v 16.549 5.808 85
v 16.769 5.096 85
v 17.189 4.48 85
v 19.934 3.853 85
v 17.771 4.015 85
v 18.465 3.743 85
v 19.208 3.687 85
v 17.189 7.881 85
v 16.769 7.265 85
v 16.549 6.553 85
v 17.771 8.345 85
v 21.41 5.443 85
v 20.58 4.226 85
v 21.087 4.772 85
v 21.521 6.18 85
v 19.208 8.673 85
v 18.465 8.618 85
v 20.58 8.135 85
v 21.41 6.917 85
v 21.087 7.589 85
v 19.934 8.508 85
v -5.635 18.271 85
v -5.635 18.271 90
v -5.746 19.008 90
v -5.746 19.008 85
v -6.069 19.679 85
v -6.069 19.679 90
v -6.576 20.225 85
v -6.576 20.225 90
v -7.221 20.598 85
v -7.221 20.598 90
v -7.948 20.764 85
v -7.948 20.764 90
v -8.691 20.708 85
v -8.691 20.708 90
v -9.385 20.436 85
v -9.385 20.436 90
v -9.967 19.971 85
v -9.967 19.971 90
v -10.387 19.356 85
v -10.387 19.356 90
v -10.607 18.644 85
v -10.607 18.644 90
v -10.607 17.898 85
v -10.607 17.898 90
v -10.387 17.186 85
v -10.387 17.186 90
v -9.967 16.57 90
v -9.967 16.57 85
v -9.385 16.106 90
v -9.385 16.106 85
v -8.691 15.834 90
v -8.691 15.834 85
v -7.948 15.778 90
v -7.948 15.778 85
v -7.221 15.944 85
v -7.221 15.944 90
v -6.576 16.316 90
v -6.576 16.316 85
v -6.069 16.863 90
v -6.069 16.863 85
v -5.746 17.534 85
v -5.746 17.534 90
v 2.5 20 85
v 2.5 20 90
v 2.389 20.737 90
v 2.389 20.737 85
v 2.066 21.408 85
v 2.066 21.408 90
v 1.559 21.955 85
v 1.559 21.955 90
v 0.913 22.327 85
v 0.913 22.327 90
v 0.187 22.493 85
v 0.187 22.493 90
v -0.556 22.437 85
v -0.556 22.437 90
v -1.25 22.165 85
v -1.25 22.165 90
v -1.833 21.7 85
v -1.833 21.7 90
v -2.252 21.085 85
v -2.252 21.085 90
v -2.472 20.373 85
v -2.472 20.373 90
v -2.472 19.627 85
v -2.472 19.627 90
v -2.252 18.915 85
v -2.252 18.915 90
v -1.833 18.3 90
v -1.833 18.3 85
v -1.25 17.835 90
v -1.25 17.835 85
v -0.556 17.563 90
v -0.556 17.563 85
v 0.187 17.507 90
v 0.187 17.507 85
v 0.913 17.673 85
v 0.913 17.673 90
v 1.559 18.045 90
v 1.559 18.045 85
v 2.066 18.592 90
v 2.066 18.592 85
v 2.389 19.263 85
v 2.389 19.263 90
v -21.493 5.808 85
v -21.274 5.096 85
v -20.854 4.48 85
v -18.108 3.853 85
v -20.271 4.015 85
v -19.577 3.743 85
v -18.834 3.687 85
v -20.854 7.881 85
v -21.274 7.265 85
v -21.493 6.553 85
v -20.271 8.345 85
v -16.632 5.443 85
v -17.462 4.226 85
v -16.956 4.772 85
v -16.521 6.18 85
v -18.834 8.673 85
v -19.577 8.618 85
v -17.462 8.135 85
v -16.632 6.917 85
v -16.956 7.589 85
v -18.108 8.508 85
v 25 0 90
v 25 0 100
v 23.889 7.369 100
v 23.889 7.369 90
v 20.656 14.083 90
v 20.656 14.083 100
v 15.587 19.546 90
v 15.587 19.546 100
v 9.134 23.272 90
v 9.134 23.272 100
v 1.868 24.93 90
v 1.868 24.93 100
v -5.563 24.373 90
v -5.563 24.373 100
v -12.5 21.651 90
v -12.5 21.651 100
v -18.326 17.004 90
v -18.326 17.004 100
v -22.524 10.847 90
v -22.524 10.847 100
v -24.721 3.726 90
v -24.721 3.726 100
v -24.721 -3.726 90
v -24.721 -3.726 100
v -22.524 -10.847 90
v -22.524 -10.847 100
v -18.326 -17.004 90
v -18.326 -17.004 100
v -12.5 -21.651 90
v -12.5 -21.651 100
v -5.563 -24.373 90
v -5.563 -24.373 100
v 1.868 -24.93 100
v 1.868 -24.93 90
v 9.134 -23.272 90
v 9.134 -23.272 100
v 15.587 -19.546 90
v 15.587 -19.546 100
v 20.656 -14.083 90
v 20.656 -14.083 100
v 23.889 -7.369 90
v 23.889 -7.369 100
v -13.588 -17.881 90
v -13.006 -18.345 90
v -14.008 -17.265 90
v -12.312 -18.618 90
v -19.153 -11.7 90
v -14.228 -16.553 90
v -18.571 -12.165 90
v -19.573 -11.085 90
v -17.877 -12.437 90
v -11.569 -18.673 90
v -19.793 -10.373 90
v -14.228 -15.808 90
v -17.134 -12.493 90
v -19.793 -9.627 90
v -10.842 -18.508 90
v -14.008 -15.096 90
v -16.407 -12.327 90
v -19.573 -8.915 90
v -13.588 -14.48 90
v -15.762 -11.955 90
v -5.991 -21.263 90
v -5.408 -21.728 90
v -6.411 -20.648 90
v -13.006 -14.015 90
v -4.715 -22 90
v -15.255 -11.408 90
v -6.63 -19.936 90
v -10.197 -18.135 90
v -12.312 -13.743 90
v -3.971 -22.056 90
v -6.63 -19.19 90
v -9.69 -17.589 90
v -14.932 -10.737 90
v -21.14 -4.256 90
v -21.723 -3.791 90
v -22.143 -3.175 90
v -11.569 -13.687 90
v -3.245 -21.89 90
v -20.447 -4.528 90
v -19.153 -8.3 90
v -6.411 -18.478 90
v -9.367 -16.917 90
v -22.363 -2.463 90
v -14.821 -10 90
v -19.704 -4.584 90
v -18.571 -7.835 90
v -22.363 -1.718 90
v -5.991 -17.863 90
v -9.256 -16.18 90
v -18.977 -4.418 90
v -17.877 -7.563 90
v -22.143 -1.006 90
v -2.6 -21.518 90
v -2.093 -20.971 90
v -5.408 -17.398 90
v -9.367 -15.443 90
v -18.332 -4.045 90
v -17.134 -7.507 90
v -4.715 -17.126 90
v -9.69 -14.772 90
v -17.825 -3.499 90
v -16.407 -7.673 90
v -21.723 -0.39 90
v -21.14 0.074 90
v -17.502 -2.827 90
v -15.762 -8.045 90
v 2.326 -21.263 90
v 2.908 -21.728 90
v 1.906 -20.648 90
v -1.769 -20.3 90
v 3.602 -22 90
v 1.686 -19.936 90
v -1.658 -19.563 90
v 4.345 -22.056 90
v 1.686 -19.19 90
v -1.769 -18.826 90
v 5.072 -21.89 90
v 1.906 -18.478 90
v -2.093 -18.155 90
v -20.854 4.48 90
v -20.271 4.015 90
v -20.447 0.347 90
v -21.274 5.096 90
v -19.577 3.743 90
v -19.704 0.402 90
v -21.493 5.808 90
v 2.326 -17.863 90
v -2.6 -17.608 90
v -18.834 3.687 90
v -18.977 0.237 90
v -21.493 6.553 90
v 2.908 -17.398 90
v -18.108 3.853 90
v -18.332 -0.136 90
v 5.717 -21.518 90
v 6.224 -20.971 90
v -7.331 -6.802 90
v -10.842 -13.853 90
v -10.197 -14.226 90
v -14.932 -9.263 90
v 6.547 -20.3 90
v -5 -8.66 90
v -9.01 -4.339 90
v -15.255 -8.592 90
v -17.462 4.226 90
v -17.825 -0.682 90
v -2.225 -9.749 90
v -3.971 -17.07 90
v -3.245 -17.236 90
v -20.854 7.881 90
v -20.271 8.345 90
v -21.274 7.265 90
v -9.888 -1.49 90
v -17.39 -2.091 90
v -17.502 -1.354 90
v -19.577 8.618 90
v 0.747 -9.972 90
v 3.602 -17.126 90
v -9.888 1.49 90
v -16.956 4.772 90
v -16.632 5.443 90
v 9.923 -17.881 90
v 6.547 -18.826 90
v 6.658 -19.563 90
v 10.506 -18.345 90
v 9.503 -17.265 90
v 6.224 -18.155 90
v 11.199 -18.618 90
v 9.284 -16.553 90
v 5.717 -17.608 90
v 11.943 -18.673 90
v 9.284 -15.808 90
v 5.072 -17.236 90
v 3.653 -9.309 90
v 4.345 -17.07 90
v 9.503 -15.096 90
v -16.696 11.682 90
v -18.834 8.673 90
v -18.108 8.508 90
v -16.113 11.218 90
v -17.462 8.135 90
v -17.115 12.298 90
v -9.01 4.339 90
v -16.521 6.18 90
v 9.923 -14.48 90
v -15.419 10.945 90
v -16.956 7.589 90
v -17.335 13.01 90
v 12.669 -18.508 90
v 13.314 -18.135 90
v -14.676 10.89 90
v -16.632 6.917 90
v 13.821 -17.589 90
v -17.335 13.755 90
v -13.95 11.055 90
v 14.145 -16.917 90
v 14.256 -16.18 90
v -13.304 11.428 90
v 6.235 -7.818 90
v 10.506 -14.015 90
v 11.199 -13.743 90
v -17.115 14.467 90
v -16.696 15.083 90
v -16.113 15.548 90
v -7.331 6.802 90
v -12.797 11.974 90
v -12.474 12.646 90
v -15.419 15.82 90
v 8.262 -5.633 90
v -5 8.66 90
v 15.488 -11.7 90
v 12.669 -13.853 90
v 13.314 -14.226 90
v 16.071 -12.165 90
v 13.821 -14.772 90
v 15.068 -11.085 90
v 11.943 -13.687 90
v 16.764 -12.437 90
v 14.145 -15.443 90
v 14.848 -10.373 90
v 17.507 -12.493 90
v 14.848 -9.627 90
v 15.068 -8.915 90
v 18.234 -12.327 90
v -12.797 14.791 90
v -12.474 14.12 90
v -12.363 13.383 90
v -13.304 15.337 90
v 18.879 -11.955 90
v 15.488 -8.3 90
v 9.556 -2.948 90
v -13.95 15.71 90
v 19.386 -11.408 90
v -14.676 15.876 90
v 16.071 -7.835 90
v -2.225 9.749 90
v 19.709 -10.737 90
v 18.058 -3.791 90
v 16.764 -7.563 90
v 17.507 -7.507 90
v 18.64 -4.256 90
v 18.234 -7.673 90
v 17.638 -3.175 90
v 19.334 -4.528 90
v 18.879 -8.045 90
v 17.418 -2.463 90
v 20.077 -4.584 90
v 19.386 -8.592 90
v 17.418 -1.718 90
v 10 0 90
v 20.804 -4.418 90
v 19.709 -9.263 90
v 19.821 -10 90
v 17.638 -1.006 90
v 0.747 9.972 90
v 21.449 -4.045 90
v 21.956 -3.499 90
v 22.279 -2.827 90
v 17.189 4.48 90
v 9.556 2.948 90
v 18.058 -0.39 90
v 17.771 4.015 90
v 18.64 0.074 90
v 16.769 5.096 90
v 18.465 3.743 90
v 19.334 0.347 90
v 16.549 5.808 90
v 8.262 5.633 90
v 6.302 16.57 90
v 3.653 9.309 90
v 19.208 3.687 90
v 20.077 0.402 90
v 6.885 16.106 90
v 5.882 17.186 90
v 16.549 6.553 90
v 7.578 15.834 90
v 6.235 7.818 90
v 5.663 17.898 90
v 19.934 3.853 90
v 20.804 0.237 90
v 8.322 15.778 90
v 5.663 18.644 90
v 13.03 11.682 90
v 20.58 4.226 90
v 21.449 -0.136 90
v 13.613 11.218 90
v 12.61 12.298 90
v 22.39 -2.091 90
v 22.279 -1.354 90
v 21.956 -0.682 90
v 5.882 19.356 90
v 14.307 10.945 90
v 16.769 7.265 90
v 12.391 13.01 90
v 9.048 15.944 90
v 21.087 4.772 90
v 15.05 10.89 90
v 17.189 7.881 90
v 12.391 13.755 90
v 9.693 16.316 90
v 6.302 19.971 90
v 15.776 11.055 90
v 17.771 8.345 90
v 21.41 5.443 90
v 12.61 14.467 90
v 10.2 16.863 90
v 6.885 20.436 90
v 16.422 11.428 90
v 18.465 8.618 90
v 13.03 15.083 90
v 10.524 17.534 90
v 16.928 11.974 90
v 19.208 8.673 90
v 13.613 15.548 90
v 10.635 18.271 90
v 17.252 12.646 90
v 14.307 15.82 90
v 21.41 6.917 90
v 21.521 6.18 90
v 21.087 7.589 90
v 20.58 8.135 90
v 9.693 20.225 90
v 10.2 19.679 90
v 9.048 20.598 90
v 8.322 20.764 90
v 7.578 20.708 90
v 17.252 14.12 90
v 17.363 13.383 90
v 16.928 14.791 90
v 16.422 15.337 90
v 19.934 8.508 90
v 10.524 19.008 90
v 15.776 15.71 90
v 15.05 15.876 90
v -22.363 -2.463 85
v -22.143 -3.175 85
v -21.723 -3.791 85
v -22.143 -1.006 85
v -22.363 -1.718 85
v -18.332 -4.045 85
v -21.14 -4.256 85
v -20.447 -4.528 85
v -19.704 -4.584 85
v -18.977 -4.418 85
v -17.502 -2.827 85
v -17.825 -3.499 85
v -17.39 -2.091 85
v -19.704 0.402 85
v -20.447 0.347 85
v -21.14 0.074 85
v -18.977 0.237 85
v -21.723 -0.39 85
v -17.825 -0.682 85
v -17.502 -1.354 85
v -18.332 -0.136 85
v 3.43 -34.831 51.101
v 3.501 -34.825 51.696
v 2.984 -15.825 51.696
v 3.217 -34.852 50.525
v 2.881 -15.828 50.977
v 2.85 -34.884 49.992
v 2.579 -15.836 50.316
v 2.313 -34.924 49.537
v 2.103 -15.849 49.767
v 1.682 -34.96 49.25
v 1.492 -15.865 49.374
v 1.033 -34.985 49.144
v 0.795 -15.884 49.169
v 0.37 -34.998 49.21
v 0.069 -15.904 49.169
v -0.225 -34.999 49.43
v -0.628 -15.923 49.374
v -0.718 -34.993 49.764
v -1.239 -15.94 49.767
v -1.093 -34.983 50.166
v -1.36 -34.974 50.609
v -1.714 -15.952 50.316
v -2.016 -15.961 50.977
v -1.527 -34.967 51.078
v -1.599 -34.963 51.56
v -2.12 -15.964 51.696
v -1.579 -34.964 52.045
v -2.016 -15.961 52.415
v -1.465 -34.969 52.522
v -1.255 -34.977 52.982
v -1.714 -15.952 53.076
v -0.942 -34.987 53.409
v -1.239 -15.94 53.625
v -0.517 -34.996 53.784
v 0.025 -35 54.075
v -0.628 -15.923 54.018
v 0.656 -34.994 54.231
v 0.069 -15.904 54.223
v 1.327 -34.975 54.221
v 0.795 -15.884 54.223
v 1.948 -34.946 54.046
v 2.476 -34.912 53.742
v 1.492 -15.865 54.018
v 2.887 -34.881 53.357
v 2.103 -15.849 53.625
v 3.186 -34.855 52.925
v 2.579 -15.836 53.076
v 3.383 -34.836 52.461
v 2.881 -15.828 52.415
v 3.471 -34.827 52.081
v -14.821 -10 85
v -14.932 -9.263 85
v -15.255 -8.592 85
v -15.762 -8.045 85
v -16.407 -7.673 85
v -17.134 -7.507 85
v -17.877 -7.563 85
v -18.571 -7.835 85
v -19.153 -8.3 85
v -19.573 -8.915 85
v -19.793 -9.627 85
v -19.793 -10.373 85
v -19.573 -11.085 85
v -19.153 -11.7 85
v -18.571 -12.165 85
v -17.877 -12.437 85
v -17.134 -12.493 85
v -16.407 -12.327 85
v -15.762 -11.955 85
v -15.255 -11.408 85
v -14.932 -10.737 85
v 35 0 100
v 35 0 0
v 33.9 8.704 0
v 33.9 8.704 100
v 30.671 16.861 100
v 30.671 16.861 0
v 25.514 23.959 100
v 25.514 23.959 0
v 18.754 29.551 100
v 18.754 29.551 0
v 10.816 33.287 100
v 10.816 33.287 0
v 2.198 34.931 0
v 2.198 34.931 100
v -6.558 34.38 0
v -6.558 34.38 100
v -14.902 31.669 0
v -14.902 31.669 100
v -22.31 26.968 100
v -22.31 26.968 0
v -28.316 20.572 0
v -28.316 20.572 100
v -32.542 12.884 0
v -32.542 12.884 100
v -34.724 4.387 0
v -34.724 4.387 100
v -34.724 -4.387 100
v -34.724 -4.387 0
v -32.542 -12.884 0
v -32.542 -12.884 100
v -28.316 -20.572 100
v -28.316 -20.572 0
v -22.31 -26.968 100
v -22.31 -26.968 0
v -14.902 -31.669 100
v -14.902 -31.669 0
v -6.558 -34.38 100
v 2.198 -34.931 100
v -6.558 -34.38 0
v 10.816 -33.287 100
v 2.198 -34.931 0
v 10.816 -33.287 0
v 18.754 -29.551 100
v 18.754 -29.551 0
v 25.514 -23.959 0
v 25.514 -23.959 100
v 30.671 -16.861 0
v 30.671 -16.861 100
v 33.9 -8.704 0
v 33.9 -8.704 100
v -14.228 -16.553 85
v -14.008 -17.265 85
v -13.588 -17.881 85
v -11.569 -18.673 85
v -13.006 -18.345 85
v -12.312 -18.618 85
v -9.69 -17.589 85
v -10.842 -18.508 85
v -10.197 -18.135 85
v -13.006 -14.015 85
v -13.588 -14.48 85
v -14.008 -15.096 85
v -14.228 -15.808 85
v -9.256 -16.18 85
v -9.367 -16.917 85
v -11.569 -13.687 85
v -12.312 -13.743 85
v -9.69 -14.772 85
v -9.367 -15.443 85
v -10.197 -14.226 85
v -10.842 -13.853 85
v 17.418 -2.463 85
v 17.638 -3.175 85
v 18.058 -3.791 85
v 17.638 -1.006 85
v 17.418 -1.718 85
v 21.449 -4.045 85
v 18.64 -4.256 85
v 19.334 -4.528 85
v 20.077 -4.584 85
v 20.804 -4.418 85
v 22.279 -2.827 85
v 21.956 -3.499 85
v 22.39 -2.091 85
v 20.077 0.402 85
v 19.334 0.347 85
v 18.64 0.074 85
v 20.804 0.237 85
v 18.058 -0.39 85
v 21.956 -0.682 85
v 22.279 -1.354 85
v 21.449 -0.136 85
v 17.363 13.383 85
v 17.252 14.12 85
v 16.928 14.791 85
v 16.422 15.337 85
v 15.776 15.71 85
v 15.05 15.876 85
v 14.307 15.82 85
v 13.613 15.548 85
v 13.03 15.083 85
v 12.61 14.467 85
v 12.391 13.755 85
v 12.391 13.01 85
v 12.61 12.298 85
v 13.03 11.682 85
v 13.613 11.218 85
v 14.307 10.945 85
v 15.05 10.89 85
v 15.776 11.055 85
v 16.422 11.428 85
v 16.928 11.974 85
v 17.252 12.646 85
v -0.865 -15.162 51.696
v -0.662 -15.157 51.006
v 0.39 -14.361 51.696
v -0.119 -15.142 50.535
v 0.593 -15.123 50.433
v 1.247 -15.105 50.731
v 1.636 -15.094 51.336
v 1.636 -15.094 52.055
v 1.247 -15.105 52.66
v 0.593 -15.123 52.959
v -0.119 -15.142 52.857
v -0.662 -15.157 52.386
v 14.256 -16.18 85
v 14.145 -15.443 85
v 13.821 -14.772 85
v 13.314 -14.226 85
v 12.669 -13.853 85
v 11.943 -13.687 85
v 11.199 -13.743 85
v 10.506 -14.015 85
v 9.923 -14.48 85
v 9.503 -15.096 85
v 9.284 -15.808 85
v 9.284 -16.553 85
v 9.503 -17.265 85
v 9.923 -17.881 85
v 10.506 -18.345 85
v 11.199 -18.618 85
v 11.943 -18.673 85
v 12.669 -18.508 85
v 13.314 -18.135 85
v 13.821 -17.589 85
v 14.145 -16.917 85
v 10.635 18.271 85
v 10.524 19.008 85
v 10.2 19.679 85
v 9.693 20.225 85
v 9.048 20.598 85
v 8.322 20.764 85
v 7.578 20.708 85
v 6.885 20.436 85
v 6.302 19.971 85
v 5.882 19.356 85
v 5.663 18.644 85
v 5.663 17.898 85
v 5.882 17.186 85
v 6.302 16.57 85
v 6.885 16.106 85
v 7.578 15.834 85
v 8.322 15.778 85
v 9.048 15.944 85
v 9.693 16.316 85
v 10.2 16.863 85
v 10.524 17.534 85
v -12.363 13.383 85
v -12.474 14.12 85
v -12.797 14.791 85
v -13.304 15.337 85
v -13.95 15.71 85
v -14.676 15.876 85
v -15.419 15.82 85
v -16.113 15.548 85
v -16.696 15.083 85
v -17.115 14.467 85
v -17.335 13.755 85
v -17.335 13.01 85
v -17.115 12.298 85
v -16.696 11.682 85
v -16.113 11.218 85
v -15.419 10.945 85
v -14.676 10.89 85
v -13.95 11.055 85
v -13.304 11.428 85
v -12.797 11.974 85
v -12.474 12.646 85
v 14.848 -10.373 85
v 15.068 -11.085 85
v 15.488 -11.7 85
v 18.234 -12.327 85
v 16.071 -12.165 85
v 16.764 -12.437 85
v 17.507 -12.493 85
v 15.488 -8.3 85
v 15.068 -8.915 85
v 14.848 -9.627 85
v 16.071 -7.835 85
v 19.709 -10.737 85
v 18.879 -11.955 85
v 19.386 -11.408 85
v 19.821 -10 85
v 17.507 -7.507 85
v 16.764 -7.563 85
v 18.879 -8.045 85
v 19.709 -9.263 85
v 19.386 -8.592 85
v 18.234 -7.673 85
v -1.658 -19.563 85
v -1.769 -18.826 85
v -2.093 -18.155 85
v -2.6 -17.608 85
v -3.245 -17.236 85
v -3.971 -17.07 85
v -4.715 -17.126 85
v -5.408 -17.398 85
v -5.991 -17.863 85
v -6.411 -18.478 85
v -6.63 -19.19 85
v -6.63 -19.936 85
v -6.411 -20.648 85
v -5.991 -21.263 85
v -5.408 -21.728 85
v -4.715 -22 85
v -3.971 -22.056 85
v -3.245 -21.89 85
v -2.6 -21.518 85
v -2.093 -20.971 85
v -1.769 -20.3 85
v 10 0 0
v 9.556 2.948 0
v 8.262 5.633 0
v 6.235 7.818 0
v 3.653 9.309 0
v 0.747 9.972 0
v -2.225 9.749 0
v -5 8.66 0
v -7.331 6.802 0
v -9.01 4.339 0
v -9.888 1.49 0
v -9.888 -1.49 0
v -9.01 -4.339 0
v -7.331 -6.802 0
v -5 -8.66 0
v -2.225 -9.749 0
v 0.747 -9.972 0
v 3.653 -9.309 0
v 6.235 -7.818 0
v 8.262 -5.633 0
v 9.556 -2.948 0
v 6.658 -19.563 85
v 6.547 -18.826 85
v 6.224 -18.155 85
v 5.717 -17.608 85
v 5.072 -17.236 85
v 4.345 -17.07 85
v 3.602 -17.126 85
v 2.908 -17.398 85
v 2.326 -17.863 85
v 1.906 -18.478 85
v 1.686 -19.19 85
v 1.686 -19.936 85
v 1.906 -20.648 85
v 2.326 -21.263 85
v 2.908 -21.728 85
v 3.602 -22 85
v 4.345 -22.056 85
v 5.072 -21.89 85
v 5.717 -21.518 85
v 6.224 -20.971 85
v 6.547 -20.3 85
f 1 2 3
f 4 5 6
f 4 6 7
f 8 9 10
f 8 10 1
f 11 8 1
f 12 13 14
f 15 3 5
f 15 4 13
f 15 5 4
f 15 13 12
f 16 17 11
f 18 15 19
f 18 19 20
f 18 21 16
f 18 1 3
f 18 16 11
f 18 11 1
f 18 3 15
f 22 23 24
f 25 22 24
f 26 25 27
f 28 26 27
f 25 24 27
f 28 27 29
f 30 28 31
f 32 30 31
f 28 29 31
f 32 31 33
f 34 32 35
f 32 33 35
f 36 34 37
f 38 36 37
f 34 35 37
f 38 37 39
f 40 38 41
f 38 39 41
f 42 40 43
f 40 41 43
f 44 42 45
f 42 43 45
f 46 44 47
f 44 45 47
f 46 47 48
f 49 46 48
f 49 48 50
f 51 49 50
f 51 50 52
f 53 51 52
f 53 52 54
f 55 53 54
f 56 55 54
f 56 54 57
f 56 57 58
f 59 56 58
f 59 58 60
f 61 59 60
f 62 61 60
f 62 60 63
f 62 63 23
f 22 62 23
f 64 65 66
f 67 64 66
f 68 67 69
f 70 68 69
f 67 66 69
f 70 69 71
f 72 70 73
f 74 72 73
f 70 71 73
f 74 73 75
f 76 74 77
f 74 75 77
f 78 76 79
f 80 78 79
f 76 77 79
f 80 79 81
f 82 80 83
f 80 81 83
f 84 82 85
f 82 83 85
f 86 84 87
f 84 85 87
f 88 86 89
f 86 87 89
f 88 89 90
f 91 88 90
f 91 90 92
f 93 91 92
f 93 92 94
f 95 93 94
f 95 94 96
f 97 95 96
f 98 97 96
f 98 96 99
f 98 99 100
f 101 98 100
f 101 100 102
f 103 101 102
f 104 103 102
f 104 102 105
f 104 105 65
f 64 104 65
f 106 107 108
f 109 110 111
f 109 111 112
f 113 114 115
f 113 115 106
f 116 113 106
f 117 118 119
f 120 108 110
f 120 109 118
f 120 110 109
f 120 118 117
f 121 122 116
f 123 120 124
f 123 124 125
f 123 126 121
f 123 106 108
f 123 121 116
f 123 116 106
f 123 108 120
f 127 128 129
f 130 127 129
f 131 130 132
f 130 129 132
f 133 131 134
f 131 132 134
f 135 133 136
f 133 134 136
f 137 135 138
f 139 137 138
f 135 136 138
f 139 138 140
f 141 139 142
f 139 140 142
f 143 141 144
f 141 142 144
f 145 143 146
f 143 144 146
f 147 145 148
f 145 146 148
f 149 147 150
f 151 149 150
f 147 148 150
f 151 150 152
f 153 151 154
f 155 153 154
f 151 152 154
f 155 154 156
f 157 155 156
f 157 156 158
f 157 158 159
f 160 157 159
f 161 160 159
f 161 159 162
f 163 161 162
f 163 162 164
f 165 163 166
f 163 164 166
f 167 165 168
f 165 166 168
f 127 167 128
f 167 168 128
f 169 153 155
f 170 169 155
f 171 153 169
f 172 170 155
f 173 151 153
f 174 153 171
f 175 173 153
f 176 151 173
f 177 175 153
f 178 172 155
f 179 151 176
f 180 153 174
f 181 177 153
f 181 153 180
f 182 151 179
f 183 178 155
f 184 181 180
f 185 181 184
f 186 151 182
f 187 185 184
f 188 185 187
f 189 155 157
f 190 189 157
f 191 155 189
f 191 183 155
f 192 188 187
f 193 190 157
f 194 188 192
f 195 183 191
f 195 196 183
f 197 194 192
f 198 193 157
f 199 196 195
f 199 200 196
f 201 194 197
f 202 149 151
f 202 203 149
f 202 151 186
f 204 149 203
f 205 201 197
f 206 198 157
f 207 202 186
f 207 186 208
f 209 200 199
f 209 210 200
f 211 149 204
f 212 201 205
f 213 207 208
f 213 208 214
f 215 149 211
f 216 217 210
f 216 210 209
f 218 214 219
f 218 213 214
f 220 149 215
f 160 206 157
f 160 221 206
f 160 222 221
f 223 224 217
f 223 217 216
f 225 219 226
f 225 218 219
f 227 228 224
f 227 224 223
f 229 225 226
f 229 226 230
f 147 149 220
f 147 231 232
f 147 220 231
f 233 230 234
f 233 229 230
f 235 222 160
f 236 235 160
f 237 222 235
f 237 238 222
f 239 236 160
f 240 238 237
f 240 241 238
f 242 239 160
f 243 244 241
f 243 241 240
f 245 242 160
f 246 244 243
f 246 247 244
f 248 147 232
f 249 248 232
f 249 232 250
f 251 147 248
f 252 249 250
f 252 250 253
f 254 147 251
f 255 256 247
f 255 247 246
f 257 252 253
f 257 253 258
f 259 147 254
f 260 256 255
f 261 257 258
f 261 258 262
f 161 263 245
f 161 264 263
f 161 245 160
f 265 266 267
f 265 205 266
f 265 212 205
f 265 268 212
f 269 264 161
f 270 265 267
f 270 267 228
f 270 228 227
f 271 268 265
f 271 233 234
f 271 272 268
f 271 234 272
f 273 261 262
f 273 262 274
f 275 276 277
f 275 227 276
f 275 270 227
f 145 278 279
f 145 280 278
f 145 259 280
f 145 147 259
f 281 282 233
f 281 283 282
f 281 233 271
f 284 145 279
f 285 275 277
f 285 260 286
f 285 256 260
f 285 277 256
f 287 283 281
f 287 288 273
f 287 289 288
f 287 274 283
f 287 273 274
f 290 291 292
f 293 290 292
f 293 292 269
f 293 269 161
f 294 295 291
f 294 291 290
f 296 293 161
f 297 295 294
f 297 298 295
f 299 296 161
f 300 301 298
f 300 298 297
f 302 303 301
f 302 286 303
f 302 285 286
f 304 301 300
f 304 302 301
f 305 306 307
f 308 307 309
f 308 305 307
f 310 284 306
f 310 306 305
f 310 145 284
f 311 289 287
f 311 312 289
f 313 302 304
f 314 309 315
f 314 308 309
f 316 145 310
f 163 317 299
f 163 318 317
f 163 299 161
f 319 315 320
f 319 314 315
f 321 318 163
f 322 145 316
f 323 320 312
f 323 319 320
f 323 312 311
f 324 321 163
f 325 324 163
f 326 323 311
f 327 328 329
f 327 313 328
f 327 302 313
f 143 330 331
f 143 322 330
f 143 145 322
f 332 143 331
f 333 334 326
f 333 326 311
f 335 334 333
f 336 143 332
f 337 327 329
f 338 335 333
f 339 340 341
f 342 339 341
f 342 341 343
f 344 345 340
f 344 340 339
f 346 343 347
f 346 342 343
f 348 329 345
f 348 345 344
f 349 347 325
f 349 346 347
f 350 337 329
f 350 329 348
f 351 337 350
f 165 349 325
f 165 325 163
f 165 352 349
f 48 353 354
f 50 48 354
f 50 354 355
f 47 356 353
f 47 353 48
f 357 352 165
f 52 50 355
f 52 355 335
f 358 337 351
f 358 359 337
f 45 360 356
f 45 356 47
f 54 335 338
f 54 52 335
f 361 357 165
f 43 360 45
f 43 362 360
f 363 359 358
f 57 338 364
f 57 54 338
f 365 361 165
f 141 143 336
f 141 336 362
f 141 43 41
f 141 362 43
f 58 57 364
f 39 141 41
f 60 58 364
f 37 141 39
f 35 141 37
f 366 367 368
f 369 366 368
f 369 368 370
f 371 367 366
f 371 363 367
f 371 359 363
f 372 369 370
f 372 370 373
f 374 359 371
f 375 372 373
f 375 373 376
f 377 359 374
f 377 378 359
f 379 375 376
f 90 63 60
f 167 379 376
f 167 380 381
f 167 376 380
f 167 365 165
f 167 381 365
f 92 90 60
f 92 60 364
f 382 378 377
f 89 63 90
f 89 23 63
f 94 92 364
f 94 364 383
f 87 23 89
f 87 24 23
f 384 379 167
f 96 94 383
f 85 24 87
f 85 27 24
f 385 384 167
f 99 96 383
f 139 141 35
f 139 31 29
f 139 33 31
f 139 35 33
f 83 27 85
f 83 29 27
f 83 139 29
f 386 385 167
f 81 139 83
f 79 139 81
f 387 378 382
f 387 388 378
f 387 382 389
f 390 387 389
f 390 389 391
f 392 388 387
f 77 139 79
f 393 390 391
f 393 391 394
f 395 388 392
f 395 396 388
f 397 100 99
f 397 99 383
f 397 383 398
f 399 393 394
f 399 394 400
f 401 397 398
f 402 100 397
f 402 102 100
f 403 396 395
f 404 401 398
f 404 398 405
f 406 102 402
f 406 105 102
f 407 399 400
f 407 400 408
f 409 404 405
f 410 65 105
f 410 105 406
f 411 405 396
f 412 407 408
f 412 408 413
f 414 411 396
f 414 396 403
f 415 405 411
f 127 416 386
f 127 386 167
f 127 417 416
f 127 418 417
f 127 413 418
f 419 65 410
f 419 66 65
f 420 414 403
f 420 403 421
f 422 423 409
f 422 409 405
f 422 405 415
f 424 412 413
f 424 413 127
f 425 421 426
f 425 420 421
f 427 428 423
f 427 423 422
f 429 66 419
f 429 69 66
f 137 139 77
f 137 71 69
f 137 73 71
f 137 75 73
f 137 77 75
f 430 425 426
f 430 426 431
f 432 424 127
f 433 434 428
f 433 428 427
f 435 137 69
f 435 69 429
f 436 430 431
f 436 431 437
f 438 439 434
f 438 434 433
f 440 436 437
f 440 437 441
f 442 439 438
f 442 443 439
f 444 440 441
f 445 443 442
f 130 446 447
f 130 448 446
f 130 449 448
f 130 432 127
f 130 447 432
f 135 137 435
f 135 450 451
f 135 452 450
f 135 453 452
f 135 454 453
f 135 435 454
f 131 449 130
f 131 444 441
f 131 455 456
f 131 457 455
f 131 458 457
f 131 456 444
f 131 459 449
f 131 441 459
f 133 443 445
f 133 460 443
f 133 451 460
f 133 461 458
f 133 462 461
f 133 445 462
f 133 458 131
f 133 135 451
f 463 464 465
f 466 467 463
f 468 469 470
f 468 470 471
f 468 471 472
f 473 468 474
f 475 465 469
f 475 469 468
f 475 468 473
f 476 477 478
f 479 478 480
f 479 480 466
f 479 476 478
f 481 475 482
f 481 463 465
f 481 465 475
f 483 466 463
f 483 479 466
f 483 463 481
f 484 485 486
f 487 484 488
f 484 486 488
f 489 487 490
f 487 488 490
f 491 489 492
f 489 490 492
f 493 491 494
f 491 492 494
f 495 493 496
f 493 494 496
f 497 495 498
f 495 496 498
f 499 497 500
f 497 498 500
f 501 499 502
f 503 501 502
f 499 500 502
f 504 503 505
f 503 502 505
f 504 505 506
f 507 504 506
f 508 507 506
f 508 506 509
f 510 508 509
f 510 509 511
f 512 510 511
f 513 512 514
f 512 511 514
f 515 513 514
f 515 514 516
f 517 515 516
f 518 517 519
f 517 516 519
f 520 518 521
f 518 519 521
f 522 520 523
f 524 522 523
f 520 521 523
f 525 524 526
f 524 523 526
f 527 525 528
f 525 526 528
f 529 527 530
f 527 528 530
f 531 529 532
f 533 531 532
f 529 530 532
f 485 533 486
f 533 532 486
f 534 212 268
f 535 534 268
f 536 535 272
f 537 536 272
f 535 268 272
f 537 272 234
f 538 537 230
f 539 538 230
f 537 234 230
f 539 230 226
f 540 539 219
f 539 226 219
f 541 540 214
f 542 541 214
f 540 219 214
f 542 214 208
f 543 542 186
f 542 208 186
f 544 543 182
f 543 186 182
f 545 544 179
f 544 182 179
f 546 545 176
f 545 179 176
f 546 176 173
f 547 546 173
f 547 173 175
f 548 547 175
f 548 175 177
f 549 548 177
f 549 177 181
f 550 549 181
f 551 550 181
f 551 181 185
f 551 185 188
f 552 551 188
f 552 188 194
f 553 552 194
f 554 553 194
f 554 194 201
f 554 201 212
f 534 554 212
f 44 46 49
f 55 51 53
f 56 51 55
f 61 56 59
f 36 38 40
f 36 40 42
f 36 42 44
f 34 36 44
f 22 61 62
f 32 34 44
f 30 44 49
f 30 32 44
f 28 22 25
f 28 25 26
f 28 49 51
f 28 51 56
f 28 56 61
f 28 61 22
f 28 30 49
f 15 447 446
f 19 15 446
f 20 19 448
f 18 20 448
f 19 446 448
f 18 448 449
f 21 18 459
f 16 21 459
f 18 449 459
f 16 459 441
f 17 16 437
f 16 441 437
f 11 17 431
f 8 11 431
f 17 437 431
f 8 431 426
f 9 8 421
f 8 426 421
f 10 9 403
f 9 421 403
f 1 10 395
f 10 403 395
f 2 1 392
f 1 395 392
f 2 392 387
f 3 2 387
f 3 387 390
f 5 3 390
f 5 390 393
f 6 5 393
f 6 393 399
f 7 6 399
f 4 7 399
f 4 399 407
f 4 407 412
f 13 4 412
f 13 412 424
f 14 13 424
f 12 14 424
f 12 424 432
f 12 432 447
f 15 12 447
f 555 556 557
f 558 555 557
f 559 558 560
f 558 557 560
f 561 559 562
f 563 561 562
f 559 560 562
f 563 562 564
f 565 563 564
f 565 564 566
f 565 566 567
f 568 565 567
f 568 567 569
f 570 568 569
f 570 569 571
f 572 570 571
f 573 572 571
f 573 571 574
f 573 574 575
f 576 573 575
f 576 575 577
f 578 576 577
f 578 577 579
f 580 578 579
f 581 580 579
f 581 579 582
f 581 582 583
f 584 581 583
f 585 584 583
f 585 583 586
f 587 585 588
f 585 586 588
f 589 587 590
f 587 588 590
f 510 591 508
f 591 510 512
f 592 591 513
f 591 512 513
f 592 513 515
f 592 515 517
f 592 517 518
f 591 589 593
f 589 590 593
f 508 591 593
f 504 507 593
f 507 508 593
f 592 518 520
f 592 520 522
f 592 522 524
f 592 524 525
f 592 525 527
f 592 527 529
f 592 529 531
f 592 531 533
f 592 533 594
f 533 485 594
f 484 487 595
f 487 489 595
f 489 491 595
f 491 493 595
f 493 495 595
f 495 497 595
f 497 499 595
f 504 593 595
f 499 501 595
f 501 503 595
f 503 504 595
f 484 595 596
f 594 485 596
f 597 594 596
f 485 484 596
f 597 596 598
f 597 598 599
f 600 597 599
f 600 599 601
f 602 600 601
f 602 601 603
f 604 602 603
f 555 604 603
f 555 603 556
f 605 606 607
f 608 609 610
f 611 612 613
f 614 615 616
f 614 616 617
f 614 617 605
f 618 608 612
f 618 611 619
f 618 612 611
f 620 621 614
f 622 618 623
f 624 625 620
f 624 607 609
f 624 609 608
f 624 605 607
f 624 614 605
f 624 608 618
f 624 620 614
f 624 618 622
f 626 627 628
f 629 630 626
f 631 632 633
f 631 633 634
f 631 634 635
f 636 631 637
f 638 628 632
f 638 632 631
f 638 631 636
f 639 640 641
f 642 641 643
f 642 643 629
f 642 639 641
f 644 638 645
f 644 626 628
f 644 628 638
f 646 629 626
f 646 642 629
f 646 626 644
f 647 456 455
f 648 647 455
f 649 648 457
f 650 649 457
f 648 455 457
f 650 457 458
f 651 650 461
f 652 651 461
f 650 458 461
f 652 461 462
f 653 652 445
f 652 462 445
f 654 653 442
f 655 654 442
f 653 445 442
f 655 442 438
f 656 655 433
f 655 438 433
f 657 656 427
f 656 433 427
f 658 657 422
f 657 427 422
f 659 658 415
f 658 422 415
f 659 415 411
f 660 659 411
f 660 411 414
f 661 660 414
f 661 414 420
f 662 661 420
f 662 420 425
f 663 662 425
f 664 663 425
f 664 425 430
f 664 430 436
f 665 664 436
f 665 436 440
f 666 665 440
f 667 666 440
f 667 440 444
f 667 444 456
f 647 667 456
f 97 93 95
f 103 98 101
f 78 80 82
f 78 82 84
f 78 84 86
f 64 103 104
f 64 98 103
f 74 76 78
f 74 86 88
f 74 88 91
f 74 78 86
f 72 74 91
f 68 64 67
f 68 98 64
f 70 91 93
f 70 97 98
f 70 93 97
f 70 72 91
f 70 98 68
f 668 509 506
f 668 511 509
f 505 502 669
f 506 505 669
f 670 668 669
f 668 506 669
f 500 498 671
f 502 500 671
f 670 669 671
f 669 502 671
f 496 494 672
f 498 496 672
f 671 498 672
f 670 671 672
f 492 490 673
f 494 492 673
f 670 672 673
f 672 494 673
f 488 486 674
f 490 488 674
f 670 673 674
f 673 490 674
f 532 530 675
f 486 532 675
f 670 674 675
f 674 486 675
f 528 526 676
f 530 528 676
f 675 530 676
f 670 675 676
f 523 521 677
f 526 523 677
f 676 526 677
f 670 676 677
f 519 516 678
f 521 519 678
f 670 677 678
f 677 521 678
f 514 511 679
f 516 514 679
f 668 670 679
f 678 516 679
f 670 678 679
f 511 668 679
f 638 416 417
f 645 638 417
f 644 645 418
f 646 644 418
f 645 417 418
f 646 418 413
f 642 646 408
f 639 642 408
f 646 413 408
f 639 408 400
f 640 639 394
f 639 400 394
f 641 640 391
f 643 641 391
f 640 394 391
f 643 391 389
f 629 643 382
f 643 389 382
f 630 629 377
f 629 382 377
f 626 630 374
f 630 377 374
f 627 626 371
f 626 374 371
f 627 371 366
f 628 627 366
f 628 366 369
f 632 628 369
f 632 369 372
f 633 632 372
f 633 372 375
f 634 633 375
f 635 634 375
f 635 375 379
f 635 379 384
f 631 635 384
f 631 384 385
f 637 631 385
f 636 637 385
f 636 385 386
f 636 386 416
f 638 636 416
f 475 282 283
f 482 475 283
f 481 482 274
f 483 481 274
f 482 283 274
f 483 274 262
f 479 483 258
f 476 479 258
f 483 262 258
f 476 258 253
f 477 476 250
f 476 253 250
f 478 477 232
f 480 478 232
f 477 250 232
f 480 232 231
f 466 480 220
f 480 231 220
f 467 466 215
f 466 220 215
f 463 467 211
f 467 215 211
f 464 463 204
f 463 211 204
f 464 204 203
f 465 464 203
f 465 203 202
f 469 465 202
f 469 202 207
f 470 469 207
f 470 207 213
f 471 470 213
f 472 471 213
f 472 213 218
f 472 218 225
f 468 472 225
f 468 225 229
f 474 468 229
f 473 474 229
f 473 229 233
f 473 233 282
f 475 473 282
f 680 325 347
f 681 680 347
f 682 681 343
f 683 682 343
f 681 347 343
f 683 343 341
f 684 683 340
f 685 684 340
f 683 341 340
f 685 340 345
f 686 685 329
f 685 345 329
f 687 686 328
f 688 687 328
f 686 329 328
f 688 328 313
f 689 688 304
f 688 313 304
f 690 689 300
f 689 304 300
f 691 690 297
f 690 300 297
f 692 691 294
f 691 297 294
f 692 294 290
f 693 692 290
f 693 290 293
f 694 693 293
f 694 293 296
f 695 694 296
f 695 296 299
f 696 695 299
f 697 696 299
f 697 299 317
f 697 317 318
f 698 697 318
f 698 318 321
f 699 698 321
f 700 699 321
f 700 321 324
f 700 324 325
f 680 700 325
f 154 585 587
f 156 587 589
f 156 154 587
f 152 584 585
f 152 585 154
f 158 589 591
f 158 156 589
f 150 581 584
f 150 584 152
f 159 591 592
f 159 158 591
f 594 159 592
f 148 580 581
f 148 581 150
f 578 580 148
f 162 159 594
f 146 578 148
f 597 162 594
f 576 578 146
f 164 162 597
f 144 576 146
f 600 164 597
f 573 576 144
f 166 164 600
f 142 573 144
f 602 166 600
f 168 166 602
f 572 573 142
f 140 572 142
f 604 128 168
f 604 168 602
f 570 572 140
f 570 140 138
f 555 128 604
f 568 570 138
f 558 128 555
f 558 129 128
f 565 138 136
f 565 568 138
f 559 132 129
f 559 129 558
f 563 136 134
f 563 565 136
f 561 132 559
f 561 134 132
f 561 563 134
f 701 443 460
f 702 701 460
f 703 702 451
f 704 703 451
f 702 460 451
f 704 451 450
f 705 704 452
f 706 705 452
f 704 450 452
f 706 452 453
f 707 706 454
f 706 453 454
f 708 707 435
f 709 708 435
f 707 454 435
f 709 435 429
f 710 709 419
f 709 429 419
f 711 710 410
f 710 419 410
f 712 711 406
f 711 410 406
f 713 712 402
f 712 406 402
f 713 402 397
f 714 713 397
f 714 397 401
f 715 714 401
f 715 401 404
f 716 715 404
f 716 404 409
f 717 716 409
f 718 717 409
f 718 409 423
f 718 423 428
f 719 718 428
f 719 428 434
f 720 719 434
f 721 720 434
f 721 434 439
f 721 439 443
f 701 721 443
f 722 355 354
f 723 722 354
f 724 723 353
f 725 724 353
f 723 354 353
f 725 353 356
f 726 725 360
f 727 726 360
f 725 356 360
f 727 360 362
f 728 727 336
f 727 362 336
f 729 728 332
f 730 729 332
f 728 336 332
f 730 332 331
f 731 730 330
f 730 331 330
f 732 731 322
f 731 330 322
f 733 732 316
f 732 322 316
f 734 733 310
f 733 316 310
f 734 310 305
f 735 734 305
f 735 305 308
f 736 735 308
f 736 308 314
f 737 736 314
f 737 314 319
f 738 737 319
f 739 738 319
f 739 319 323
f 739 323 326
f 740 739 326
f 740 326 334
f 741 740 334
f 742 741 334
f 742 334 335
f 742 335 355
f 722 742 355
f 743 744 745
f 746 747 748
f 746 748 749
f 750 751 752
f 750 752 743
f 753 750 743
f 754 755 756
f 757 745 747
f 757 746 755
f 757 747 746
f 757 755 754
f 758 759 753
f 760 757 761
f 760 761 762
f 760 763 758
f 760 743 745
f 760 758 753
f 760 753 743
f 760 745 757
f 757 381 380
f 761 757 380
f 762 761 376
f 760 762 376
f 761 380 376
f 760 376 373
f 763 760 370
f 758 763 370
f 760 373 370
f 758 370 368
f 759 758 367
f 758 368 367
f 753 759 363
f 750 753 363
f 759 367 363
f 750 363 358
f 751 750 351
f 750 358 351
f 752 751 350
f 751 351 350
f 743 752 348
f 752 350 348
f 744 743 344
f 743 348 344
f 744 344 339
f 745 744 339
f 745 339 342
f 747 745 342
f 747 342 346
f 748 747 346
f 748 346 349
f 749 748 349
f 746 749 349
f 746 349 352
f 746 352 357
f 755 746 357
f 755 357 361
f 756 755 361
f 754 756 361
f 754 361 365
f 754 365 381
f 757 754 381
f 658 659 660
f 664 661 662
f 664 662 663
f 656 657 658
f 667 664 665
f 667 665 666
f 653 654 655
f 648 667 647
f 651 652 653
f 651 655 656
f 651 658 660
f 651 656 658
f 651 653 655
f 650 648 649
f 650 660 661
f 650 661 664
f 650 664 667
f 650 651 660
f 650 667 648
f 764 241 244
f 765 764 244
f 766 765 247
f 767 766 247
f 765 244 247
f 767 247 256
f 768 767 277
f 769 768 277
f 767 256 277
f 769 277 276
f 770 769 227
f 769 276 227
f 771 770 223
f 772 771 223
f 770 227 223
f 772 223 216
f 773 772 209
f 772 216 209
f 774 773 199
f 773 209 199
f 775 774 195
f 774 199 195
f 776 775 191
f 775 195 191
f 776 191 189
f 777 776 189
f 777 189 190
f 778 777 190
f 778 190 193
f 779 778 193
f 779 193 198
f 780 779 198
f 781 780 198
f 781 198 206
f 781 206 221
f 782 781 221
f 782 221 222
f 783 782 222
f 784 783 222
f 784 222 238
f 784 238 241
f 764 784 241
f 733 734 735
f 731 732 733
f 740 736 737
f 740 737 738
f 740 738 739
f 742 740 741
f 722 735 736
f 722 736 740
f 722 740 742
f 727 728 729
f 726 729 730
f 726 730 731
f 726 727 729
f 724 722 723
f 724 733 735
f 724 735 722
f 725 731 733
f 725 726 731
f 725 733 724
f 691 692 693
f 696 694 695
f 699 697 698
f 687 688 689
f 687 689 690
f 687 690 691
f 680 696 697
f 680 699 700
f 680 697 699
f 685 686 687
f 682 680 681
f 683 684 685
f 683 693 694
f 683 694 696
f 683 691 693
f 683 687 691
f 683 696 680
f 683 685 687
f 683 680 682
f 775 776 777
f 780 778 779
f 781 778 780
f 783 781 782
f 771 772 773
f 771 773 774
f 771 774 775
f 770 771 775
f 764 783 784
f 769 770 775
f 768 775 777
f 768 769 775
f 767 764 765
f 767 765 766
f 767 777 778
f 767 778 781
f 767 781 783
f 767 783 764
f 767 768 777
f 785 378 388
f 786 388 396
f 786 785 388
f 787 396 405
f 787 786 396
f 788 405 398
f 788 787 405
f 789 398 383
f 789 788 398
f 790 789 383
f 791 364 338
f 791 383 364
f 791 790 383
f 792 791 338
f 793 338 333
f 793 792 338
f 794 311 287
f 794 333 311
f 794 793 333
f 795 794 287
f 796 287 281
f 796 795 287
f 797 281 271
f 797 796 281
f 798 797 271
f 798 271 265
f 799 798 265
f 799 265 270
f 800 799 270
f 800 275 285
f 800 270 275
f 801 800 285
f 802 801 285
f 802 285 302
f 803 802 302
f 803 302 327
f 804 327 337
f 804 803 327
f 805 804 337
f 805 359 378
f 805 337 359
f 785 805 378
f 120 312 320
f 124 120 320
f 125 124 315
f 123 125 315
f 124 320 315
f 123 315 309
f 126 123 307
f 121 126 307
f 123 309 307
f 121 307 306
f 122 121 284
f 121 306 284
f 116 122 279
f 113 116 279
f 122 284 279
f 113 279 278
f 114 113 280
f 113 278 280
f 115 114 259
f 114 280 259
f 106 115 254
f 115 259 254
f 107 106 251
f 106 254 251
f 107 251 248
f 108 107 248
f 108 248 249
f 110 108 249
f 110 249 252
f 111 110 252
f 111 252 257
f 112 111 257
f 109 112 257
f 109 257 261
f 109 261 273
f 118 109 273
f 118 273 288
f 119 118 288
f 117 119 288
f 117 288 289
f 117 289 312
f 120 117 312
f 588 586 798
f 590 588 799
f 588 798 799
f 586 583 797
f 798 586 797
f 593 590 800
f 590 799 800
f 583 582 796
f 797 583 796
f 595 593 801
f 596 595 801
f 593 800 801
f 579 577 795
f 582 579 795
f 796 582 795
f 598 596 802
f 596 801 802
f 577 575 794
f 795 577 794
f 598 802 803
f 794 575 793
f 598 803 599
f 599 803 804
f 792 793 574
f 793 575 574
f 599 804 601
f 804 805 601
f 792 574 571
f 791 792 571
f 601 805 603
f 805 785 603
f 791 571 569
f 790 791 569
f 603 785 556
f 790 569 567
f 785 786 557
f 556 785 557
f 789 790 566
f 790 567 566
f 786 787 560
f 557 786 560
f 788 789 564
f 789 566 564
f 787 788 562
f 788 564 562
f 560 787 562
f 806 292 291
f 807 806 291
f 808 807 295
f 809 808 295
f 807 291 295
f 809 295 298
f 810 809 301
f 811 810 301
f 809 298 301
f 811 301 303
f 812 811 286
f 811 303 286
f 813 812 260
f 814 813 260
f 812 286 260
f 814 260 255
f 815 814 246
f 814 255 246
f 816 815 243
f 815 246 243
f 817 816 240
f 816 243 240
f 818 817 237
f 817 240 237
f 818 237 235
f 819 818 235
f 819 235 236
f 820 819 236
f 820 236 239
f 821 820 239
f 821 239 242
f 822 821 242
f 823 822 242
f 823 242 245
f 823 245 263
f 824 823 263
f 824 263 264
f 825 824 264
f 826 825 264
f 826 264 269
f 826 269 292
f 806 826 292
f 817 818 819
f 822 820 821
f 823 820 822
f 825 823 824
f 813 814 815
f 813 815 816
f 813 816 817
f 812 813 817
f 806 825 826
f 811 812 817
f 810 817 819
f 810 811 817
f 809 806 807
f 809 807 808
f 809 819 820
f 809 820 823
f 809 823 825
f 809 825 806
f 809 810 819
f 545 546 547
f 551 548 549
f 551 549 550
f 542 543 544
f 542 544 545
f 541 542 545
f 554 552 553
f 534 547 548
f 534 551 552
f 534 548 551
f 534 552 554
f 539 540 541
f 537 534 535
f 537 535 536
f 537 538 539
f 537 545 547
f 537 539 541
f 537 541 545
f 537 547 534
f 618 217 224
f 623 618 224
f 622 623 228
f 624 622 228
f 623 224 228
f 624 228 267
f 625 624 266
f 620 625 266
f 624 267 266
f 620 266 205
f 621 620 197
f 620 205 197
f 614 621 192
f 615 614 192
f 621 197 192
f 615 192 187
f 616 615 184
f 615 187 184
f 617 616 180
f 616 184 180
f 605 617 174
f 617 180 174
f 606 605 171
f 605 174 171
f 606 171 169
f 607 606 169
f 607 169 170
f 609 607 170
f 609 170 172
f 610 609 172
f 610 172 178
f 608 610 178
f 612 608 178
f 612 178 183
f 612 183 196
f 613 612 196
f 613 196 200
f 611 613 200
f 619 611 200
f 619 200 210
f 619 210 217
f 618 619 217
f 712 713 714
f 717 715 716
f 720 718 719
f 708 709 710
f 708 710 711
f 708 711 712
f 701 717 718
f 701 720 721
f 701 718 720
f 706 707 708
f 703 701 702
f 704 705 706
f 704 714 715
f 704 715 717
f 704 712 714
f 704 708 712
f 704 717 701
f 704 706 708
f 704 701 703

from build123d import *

# Parameters (mm, degrees)
SKETCH1_R                   = 35
BOSS_EXTRUDE1_DEPTH         = 100
SKETCH2_R                   = 2.5
CUT_EXTRUDE5_DEPTH          = 15
SKETCH2_7_R                 = 25
CUT_EXTRUDE6_DEPTH          = 10
SKETCH3_R                   = 10
CUT_EXTRUDE8_DEPTH          = 112.579568022
F_1_4_20_TAPPED_HOLE1_D     = 5.1054
F_1_4_20_TAPPED_HOLE1_DEPTH = 19.1
F_1_4_20_TAPPED_HOLE1_TIP   = 1.533816902


with BuildPart() as part:
    # Sketch1 → Boss-Extrude1 (new body)
    with BuildSketch(Plane.XY):
        Circle(SKETCH1_R)
    extrude(amount=BOSS_EXTRUDE1_DEPTH)

    # Sketch2 → Cut-Extrude5 (cut)
    with BuildSketch(Plane.XY.offset(100)):
        with Locations((0, 20)):
            Circle(SKETCH2_R)
        with Locations((8.134732862, 18.270909153)):
            Circle(SKETCH2_R)
        with Locations((14.86289651, 13.382612127)):
            Circle(SKETCH2_R)
        with Locations((19.021130326, 6.180339887)):
            Circle(SKETCH2_R)
        with Locations((19.890437907, -2.090569265)):
            Circle(SKETCH2_R)
        with Locations((17.320508076, -10)):
            Circle(SKETCH2_R)
        with Locations((11.755705046, -16.180339887)):
            Circle(SKETCH2_R)
        with Locations((4.158233816, -19.562952015)):
            Circle(SKETCH2_R)
        with Locations((-4.158233816, -19.562952015)):
            Circle(SKETCH2_R)
        with Locations((-11.755705046, -16.180339887)):
            Circle(SKETCH2_R)
        with Locations((-17.320508076, -10)):
            Circle(SKETCH2_R)
        with Locations((-19.890437907, -2.090569265)):
            Circle(SKETCH2_R)
        with Locations((-19.021130326, 6.180339887)):
            Circle(SKETCH2_R)
        with Locations((-14.86289651, 13.382612127)):
            Circle(SKETCH2_R)
        with Locations((-8.134732862, 18.270909153)):
            Circle(SKETCH2_R)
    extrude(amount=-CUT_EXTRUDE5_DEPTH, mode=Mode.SUBTRACT)

    # Sketch2<7> → Cut-Extrude6 (cut)
    with BuildSketch(Plane.XY.offset(100)):
        Circle(SKETCH2_7_R)
    extrude(amount=-CUT_EXTRUDE6_DEPTH, mode=Mode.SUBTRACT)

    # Sketch3 → Cut-Extrude8 (cut, through all)
    with BuildSketch(Plane.XY):
        Circle(SKETCH3_R)
    extrude(amount=CUT_EXTRUDE8_DEPTH, mode=Mode.SUBTRACT)

    # 1/4-20 Tapped Hole1
    with Locations(Plane(origin=(0.951346155, -34.987068189, 51.695877928), x_dir=(-0.999630519699, -0.027181318711, 0), z_dir=(0.027181318711, -0.999630519699, 0))):
        with Locations((0, 0)):
            Hole(F_1_4_20_TAPPED_HOLE1_D / 2, depth=F_1_4_20_TAPPED_HOLE1_DEPTH)
            with Locations((0, 0, -(F_1_4_20_TAPPED_HOLE1_DEPTH + F_1_4_20_TAPPED_HOLE1_TIP / 2))):  # 118° drill point
                Cone(0, F_1_4_20_TAPPED_HOLE1_D / 2, F_1_4_20_TAPPED_HOLE1_TIP, mode=Mode.SUBTRACT)


solid = part.part
